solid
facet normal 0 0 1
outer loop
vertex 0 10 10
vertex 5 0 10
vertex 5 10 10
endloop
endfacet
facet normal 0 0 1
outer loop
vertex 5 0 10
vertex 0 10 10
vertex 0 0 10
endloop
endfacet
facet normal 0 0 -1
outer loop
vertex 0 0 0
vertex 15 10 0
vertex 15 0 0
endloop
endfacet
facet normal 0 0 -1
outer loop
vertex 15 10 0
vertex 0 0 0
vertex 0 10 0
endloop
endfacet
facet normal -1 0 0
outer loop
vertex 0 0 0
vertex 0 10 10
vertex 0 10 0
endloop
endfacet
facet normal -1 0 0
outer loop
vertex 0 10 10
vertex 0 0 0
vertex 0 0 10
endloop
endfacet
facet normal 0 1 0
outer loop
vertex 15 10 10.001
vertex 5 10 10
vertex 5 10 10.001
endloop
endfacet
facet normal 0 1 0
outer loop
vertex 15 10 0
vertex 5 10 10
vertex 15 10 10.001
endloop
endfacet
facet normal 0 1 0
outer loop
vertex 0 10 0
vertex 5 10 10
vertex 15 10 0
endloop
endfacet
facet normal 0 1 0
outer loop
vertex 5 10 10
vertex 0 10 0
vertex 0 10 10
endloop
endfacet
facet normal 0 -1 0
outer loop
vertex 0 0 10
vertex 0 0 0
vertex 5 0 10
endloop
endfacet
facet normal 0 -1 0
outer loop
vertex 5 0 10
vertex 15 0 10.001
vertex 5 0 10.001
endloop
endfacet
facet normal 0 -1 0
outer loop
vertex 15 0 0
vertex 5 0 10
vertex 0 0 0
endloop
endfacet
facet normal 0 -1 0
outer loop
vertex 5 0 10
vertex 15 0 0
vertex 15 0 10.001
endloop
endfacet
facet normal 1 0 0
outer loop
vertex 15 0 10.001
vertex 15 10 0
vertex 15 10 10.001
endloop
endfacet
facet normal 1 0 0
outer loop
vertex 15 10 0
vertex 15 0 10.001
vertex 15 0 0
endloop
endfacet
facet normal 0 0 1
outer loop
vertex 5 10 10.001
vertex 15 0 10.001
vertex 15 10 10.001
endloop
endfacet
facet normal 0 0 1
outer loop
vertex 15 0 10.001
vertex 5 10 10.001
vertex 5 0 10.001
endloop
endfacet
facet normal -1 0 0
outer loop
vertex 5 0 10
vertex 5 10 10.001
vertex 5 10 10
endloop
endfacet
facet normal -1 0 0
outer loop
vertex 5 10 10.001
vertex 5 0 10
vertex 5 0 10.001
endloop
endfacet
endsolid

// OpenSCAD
color("green", filament = 5) cube(10);
color("blue") translate([5,0,0]) cube([10,10,10.001]);
